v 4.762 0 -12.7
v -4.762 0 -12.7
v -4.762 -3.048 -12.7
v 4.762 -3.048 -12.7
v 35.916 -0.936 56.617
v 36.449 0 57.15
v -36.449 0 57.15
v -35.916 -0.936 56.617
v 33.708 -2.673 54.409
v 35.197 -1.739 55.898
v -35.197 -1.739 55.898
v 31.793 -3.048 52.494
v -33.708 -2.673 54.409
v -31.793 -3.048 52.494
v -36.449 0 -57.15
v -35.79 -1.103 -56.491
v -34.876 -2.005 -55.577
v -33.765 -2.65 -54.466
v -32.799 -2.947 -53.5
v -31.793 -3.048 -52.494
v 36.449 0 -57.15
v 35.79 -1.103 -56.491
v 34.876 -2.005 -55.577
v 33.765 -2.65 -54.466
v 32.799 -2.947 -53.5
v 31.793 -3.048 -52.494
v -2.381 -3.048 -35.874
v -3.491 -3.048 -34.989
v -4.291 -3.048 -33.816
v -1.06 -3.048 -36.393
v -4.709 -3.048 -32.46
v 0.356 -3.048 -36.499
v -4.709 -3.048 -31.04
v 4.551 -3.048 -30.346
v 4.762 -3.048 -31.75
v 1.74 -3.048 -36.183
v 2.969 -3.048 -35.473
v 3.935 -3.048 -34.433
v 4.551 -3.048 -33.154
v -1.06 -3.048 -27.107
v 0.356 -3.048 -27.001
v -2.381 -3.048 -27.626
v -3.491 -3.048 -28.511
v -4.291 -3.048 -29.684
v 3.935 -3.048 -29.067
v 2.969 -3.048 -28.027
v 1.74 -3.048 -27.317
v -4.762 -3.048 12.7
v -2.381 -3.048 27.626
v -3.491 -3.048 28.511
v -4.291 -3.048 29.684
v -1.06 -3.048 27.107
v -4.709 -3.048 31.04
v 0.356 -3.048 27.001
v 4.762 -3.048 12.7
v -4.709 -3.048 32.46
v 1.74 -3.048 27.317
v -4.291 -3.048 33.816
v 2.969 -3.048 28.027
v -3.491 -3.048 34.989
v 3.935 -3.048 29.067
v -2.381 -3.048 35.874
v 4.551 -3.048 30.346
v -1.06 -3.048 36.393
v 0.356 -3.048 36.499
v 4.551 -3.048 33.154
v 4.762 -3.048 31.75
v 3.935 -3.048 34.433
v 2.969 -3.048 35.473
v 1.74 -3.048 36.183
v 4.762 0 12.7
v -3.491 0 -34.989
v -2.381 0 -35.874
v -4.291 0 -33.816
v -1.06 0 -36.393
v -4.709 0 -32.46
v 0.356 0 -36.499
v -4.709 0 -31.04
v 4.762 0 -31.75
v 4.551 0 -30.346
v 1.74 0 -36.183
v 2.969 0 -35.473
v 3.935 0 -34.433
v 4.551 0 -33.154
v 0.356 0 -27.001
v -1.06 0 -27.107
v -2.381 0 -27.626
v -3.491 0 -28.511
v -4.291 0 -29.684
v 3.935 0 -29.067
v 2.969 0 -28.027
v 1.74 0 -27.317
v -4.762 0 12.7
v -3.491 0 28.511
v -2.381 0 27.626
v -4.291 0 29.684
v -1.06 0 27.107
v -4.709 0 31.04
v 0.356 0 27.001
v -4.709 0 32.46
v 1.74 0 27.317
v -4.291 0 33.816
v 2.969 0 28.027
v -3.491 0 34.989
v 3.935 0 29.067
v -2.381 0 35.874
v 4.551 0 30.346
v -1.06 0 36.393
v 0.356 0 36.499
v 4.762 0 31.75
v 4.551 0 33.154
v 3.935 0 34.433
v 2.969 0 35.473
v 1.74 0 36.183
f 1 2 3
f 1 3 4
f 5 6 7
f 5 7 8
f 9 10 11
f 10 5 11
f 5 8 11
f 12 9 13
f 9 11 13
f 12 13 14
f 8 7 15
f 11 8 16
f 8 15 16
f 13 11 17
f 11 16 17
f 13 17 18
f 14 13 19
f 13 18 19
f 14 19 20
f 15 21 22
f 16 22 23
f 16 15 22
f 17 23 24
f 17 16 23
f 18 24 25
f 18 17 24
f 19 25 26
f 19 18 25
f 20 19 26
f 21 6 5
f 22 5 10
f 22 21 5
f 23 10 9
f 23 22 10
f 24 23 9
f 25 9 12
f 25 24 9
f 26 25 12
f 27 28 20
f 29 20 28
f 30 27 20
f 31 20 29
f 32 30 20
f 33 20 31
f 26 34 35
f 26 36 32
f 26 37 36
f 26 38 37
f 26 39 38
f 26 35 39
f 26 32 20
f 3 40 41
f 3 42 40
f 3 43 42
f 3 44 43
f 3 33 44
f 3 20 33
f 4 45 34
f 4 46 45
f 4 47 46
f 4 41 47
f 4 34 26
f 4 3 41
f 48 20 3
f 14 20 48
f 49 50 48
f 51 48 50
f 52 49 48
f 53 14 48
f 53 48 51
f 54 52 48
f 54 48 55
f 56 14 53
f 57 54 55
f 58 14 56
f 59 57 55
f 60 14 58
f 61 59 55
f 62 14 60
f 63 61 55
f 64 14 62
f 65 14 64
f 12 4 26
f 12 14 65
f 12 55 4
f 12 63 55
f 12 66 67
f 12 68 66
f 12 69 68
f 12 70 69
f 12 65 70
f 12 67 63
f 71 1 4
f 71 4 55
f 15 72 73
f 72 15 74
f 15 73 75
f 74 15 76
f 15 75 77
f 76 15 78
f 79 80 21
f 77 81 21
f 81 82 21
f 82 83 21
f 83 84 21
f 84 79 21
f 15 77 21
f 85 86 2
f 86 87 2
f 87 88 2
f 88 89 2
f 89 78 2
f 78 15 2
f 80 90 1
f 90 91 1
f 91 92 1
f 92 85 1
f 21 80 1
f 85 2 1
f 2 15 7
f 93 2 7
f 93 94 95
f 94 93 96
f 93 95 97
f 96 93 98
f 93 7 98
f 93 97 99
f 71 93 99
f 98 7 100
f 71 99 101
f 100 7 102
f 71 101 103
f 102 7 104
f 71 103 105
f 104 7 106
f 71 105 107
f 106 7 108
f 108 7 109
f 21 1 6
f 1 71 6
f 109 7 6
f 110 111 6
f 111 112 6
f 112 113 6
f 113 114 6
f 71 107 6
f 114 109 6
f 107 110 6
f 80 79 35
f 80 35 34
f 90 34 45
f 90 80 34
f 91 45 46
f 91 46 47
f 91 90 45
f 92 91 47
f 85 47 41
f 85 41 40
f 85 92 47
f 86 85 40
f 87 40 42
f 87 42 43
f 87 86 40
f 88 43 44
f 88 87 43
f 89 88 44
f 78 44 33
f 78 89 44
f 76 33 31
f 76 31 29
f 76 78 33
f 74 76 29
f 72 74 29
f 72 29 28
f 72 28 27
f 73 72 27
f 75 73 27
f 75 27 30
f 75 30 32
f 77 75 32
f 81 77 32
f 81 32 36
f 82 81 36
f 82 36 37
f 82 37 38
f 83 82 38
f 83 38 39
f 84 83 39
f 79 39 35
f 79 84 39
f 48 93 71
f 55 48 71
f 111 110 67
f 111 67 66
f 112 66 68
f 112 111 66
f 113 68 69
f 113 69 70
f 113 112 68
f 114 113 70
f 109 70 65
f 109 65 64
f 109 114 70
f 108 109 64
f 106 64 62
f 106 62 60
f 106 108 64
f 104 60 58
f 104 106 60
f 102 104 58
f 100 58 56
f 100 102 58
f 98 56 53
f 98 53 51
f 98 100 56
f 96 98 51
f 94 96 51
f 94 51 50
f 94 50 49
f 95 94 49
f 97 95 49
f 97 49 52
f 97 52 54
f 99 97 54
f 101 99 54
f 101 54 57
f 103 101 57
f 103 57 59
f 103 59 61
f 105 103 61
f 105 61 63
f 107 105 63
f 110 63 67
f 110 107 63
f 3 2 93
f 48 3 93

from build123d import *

# Parameters (mm, degrees)
F0_W        = 72.898
F0_H        = 114.3
F0_R        = 4.7625
F0_W_2      = 9.525
F0_H_2      = 25.4
F1_DEPTH    = 3.048
F2_T1_DEPTH = 96.1774845304
F2_T3_DEPTH = 137.5794845304


# Not quite as in the source:
# - a fillet or chamfer that OpenCascade refuses, or shapes differently, is made with other operations: its cross-section is extruded or revolved along the edge and cut away or added


with BuildPart() as f1:
    # F0 (on Front) → F1 (new body)
    with BuildSketch(Plane.XZ):
        Rectangle(F0_W, F0_H)
        with Locations((0, -31.75)):
            Circle(F0_R, mode=Mode.SUBTRACT)
        Rectangle(F0_W_2, F0_H_2, mode=Mode.SUBTRACT)
        with Locations((0, 31.75)):
            Circle(F0_R, mode=Mode.SUBTRACT)
    extrude(amount=F1_DEPTH)

    # F2: fillet of radius 5.08 on 4 edges, made by hand

    # F2_s2 → F2_t1 (cut)
    with BuildSketch(Plane.YZ.offset(-48.0887422652)):
        with BuildLine():
            ThreePointArc((0, 57.15), (-2.2182329348, 55.2765336861), (-3.048, 52.4941030939))
            Line((-3.048, 52.4941030939), (-3.048, 57.15))
            Line((-3.048, 57.15), (0, 57.15))
        make_face()
        with BuildLine():
            ThreePointArc((0, -57.15), (-2.2182329348, -55.2765336861), (-3.048, -52.4941030939))
            Line((-3.048, -52.4941030939), (-3.048, -57.15))
            Line((-3.048, -57.15), (0, -57.15))
        make_face()
    extrude(amount=F2_T1_DEPTH, mode=Mode.SUBTRACT)

    # F2_s4 → F2_t3 (cut)
    with BuildSketch(Plane.XY.offset(-68.7897422652)):
        with BuildLine():
            ThreePointArc((36.449, 0), (34.5755336861, -2.2182329348), (31.7931030939, -3.048))
            Line((31.7931030939, -3.048), (36.449, -3.048))
            Line((36.449, -3.048), (36.449, 0))
        make_face()
        with BuildLine():
            ThreePointArc((-36.449, 0), (-34.5755336861, -2.2182329348), (-31.7931030939, -3.048))
            Line((-31.7931030939, -3.048), (-36.449, -3.048))
            Line((-36.449, -3.048), (-36.449, 0))
        make_face()
    extrude(amount=F2_T3_DEPTH, mode=Mode.SUBTRACT)


solid = f1.part
